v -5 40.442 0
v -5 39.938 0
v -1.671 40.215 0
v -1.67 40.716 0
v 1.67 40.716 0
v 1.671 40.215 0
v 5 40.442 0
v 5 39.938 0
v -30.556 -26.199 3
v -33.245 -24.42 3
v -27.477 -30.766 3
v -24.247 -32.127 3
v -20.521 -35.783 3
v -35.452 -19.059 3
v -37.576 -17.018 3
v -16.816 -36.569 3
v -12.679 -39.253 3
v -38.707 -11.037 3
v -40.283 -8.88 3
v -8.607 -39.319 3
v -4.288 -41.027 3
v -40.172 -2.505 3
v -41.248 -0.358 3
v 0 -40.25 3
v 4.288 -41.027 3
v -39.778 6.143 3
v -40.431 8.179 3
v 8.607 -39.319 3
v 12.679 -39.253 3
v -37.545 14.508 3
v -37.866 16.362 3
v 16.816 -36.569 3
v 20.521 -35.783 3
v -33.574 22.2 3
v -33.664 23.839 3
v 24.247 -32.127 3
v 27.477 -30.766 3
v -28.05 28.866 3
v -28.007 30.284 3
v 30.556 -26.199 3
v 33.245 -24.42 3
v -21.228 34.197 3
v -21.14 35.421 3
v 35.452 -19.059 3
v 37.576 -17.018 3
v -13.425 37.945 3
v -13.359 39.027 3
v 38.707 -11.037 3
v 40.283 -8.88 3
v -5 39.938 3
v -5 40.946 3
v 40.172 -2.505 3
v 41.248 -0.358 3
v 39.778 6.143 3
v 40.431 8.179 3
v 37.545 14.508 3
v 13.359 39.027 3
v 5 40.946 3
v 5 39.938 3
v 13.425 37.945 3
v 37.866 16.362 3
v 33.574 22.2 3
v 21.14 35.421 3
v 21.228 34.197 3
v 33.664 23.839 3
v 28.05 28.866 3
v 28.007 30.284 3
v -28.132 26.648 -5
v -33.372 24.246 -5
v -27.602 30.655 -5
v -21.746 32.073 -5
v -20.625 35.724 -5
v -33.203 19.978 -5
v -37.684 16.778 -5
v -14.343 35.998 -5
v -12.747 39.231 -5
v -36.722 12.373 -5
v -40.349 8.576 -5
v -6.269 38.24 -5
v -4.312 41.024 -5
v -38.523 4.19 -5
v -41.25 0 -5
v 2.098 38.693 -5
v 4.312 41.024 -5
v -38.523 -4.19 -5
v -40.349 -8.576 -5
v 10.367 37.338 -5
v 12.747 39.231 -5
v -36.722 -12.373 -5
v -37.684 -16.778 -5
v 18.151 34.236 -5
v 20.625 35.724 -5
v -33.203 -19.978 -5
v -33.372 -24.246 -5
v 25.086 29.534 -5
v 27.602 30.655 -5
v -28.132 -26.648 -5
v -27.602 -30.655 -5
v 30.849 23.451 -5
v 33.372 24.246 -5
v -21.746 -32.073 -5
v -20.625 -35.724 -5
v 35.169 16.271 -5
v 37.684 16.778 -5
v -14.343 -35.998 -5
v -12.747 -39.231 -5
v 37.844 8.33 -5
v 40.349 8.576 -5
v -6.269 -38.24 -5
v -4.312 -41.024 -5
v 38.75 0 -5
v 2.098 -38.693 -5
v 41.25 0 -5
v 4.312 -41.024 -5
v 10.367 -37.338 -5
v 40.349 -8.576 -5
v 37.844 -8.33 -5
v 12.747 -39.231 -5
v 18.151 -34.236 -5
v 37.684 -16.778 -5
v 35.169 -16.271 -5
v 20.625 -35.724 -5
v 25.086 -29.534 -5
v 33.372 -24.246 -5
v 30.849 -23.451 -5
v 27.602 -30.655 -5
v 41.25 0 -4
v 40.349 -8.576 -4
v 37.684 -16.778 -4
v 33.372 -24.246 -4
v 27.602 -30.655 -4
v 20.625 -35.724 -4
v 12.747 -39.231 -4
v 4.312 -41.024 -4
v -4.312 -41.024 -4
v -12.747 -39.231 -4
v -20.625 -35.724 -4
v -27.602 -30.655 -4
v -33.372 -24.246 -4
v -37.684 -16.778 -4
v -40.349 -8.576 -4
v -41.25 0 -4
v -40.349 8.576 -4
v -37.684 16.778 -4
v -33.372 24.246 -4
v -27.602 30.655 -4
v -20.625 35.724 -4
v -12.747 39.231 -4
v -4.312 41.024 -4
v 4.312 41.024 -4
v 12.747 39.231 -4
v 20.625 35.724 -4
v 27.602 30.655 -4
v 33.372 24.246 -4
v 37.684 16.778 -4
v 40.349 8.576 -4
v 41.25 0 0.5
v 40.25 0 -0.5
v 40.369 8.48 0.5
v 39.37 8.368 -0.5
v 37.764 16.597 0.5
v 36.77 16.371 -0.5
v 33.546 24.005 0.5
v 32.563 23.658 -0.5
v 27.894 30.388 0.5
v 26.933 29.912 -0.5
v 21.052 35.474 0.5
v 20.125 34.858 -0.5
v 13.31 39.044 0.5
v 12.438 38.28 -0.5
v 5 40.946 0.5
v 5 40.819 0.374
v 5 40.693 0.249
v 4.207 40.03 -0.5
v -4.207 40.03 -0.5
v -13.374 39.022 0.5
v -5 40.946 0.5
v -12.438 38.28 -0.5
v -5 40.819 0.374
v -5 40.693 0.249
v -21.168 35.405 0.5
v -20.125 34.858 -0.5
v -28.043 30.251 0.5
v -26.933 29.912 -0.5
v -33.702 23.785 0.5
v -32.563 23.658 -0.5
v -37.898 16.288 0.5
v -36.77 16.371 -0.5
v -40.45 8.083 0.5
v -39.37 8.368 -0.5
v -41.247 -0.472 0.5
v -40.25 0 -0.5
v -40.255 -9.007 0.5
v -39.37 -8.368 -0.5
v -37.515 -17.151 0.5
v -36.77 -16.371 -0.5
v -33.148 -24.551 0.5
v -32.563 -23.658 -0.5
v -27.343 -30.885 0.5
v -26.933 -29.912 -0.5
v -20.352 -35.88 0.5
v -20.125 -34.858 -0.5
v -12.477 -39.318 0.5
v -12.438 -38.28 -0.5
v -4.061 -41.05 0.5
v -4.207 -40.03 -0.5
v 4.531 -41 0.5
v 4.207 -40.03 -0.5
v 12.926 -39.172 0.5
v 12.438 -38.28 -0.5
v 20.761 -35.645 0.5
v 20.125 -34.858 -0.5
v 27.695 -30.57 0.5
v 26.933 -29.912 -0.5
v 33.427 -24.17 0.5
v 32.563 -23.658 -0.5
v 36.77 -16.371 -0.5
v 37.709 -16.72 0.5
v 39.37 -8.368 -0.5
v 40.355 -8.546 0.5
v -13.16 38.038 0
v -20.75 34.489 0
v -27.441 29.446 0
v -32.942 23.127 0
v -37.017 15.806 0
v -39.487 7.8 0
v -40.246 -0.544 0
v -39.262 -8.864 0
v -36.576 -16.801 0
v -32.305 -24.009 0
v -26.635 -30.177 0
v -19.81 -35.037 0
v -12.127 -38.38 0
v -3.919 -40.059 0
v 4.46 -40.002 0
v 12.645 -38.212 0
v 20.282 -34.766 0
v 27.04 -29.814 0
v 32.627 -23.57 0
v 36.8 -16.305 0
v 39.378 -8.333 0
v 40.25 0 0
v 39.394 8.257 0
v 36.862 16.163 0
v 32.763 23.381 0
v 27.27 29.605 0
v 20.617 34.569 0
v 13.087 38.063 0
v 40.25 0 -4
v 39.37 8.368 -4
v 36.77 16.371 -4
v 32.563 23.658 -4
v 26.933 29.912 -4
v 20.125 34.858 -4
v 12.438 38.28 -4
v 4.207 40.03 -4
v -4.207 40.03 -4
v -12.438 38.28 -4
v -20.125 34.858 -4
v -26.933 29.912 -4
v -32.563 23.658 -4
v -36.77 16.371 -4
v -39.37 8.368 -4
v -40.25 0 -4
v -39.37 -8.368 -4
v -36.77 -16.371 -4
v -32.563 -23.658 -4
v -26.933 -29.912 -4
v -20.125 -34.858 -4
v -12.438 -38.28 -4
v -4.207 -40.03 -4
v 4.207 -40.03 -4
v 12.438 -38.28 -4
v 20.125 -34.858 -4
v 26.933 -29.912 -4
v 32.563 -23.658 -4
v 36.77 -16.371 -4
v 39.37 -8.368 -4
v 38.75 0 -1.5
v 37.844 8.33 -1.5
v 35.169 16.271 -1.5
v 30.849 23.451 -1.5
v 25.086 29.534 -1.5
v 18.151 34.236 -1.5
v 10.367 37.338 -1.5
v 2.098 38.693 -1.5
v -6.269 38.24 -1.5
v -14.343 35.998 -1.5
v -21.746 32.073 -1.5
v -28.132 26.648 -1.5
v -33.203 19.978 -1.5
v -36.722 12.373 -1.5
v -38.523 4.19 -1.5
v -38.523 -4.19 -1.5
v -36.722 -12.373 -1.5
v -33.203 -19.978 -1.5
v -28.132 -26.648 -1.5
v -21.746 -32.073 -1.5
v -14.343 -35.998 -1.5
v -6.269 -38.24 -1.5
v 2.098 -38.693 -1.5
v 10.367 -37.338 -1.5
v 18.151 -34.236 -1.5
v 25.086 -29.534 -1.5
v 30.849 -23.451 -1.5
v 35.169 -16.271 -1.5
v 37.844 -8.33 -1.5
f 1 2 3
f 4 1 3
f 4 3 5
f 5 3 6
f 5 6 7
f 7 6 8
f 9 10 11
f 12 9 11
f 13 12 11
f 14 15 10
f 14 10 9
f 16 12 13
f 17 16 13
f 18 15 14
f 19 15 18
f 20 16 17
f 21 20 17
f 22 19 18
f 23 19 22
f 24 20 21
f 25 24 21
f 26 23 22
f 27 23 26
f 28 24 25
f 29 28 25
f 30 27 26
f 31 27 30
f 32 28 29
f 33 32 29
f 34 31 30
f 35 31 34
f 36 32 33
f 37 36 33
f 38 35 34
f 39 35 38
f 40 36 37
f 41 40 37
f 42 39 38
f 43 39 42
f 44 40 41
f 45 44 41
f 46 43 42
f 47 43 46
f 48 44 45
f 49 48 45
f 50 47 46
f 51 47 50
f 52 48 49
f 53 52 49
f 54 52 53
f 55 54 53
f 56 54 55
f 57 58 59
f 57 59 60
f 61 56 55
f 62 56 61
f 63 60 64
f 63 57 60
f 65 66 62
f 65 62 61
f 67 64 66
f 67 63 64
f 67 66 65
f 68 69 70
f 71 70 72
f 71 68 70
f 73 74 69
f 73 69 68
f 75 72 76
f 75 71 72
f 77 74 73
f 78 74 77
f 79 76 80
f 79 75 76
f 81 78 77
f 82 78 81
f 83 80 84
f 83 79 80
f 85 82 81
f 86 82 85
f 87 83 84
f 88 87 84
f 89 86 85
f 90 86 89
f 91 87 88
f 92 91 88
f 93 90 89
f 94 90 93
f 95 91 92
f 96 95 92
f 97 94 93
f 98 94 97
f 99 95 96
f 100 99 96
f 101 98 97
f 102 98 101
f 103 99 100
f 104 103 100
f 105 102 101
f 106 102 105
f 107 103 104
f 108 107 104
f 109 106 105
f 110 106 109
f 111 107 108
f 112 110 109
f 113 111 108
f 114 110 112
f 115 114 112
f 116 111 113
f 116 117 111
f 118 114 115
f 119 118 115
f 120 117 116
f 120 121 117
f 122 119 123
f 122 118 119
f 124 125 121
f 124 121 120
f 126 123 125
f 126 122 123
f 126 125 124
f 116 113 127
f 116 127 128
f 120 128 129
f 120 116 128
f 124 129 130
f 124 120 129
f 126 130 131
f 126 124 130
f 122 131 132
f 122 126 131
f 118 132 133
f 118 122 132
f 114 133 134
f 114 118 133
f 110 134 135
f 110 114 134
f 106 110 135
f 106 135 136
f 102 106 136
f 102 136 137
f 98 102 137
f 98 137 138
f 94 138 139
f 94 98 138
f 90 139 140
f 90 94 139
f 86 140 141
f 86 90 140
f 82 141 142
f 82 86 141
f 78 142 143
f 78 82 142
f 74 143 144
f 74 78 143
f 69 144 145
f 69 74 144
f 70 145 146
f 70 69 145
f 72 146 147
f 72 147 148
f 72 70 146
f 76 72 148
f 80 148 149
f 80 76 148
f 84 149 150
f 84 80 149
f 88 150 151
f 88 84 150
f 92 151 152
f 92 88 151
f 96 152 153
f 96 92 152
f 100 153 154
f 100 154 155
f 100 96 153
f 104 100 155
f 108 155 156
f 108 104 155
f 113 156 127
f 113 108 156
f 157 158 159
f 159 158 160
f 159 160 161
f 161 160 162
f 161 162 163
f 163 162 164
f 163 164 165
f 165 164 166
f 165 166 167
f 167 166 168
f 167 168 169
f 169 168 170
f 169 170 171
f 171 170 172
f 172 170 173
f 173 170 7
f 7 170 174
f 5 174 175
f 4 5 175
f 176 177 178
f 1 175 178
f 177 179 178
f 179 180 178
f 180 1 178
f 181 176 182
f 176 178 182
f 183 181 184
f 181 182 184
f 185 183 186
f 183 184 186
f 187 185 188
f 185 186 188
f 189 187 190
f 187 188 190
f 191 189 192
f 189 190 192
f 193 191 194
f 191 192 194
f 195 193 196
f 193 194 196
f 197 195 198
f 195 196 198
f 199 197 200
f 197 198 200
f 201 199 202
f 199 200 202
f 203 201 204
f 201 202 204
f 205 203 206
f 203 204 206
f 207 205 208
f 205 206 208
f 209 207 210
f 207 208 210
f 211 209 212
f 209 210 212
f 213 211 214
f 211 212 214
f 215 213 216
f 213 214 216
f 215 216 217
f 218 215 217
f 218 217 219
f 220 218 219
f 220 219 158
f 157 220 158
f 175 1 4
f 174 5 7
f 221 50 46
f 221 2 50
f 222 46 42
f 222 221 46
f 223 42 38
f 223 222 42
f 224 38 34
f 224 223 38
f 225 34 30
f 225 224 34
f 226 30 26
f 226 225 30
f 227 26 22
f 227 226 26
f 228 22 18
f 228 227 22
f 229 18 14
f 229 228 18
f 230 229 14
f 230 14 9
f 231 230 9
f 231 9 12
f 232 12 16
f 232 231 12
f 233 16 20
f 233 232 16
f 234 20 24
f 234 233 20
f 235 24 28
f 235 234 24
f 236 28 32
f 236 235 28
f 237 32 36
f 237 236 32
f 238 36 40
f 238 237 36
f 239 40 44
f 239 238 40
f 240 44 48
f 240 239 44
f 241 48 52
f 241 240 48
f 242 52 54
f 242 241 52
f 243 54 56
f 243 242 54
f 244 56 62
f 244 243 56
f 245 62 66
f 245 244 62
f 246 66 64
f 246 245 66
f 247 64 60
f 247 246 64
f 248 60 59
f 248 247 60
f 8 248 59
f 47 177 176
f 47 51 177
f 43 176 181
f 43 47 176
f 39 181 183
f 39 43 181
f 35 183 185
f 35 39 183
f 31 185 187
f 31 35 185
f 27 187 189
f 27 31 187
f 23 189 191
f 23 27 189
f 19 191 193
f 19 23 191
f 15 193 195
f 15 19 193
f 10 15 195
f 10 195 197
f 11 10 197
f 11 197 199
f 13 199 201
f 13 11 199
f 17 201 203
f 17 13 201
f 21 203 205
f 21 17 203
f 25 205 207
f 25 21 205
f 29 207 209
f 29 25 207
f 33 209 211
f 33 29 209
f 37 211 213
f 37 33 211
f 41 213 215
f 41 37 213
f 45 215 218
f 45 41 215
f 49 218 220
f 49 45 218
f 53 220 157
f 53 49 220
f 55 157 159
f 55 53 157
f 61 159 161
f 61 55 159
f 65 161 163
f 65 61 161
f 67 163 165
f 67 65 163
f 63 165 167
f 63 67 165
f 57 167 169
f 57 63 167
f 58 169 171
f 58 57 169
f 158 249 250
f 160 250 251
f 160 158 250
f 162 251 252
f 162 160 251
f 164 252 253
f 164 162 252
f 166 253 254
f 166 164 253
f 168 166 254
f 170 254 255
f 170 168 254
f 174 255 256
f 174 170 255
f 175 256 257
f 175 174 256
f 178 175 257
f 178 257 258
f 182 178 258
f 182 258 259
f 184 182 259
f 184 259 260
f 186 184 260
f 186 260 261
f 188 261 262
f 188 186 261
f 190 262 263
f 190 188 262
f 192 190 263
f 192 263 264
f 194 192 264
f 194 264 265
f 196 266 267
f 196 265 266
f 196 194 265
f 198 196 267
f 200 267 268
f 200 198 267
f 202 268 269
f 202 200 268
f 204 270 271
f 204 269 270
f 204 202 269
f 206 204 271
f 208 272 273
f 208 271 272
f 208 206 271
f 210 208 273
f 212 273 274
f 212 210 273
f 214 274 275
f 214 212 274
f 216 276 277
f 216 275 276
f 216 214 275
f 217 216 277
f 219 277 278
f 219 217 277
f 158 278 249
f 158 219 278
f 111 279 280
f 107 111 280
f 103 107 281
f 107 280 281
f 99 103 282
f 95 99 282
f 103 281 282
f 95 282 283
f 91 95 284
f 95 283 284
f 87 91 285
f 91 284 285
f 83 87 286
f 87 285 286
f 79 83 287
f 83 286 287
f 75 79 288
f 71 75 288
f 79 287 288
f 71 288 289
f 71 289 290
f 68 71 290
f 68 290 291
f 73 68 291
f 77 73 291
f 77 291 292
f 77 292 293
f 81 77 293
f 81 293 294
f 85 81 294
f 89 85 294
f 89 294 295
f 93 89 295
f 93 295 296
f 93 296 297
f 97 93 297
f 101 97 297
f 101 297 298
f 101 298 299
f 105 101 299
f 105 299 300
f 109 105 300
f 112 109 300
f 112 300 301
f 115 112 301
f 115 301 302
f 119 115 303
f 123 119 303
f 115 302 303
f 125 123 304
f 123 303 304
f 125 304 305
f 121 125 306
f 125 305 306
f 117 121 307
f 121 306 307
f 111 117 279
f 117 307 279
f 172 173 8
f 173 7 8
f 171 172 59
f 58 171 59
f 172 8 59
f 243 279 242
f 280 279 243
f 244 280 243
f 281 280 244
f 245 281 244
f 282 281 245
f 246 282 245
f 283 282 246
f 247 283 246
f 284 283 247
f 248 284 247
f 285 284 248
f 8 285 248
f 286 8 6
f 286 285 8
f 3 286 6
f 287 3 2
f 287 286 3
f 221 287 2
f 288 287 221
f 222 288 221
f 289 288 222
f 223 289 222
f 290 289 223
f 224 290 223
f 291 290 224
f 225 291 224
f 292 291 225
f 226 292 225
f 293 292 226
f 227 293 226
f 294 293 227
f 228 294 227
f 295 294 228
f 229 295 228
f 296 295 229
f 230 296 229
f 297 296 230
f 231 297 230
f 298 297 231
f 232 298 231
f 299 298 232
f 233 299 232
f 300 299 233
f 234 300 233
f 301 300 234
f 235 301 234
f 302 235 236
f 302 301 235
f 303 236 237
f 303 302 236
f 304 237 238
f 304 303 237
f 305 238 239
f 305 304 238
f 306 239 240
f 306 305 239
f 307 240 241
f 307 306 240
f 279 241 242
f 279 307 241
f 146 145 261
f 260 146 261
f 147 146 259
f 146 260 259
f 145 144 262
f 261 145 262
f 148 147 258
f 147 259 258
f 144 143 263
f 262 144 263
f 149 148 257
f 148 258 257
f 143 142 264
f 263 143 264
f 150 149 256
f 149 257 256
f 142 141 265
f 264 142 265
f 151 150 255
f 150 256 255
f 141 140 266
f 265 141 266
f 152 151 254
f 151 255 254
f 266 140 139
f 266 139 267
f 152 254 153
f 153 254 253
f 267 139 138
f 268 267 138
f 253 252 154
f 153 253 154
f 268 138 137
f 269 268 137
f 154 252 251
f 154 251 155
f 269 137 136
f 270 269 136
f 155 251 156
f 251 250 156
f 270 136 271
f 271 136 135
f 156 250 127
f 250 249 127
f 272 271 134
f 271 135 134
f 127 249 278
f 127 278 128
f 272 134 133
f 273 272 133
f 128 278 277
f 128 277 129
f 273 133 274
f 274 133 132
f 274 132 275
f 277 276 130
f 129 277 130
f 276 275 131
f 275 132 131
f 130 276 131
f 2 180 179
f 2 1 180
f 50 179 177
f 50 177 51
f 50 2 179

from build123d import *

# Parameters (mm, degrees)
F0_R          = 41.25
F0_R_2        = 40.25
F1_DEPTH      = 3
F1_DEPTH_BACK = 1
F0_R_3        = 38.75
F2_DEPTH      = 5
F3_S5_R       = 40.25
F3_T6_DEPTH   = 60
F3_S11_R      = 40.25
F3_T12_DEPTH  = 58
F4_R          = 41.25
F4_R_2        = 40.25
F5_DEPTH      = 1
F7_END_RADIUS = 41.25
F6_W          = 10
F6_H          = 3
F7_REACH      = 51.6913065089


# Not quite as in the source:
# - a fillet or chamfer that OpenCascade refuses, or shapes differently, is made with other operations: its cross-section is extruded or revolved along the edge and cut away or added


with BuildPart() as f1:
    # F0 (on Top) → F1 (new body, two sides)
    with BuildSketch(Plane.XY) as f1_sk:
        Circle(F0_R)
        Circle(F0_R_2, mode=Mode.SUBTRACT)
    extrude(amount=F1_DEPTH)
    extrude(f1_sk.sketch, amount=-F1_DEPTH_BACK)

    # F0 (on Top) → F2 (join)
    with BuildSketch(Plane.XY):
        Circle(F0_R_2)
        Circle(F0_R_3, mode=Mode.SUBTRACT)
    extrude(amount=-F2_DEPTH)

    # F3: chamfer of 1.5 on 2 edges, made by hand


with BuildPart() as f3_tool2:
    # F3_s3 → F3_t4 (revolve)
    with BuildSketch(Plane.XZ):
        Polygon((41.25, 0.5), (39.75, -1), (41.25, -1), align=None)
    revolve(axis=Axis((0, 0, -1), (0, 0, 1)))

    # F3_s5 → F3_t6 (cut, symmetric)
    with BuildSketch(Plane.XY.offset(-0.3)):
        Circle(F3_S5_R)
    extrude(amount=F3_T6_DEPTH, both=True, mode=Mode.SUBTRACT)


with BuildPart() as f1_1:
    add(f1.part)

    # F3_t1: cut F3_tool2
    add(f3_tool2.part, mode=Mode.SUBTRACT)


with BuildPart() as f3_tool8:
    # F3_s9 → F3_t10 (revolve)
    with BuildSketch(Plane.XZ):
        Polygon((40.25, 0), (38.75, -1.5), (38.75, 0), align=None)
    revolve(axis=Axis((0, 0, 0), (0, 0, 1)))

    # F3_s11 → F3_t12 (intersect, symmetric)
    with BuildSketch(Plane.XY.offset(-0.8)):
        Circle(F3_S11_R)
    extrude(amount=F3_T12_DEPTH, both=True, mode=Mode.INTERSECT)


with BuildPart() as f1_2:
    add(f1_1.part)

    # F3_t7: cut F3_tool8
    add(f3_tool8.part, mode=Mode.SUBTRACT)

    # F4 (on face) → F5 (join)
    with BuildSketch(Plane(origin=(0, 0, -5), x_dir=(1, 0, 0), z_dir=(0, 0, -1))):
        Circle(F4_R)
        Circle(F4_R_2, mode=Mode.SUBTRACT)
    extrude(amount=-F5_DEPTH)

    f7_end = (Plane(origin=(0, 0, 1.75), x_dir=(-1, 0, 0), z_dir=(0, 0, -1)) * Cylinder(F7_END_RADIUS, 337.2757510104, mode=Mode.PRIVATE)).faces().sort_by_distance((-41.25, 0, 1.75))[0]
    # F6 (on Front) → F7 (cut, up to the whole of a round face its end follows)
    with BuildSketch(Plane.XZ):
        with Locations((0, 1.5)):
            Rectangle(F6_W, F6_H)
    f7_long = extrude(amount=-F7_REACH, mode=Mode.PRIVATE)
    add(split(f7_long, bisect_by=f7_end, keep=Keep.BOTTOM, mode=Mode.PRIVATE), mode=Mode.SUBTRACT)


solid = f1_2.part
